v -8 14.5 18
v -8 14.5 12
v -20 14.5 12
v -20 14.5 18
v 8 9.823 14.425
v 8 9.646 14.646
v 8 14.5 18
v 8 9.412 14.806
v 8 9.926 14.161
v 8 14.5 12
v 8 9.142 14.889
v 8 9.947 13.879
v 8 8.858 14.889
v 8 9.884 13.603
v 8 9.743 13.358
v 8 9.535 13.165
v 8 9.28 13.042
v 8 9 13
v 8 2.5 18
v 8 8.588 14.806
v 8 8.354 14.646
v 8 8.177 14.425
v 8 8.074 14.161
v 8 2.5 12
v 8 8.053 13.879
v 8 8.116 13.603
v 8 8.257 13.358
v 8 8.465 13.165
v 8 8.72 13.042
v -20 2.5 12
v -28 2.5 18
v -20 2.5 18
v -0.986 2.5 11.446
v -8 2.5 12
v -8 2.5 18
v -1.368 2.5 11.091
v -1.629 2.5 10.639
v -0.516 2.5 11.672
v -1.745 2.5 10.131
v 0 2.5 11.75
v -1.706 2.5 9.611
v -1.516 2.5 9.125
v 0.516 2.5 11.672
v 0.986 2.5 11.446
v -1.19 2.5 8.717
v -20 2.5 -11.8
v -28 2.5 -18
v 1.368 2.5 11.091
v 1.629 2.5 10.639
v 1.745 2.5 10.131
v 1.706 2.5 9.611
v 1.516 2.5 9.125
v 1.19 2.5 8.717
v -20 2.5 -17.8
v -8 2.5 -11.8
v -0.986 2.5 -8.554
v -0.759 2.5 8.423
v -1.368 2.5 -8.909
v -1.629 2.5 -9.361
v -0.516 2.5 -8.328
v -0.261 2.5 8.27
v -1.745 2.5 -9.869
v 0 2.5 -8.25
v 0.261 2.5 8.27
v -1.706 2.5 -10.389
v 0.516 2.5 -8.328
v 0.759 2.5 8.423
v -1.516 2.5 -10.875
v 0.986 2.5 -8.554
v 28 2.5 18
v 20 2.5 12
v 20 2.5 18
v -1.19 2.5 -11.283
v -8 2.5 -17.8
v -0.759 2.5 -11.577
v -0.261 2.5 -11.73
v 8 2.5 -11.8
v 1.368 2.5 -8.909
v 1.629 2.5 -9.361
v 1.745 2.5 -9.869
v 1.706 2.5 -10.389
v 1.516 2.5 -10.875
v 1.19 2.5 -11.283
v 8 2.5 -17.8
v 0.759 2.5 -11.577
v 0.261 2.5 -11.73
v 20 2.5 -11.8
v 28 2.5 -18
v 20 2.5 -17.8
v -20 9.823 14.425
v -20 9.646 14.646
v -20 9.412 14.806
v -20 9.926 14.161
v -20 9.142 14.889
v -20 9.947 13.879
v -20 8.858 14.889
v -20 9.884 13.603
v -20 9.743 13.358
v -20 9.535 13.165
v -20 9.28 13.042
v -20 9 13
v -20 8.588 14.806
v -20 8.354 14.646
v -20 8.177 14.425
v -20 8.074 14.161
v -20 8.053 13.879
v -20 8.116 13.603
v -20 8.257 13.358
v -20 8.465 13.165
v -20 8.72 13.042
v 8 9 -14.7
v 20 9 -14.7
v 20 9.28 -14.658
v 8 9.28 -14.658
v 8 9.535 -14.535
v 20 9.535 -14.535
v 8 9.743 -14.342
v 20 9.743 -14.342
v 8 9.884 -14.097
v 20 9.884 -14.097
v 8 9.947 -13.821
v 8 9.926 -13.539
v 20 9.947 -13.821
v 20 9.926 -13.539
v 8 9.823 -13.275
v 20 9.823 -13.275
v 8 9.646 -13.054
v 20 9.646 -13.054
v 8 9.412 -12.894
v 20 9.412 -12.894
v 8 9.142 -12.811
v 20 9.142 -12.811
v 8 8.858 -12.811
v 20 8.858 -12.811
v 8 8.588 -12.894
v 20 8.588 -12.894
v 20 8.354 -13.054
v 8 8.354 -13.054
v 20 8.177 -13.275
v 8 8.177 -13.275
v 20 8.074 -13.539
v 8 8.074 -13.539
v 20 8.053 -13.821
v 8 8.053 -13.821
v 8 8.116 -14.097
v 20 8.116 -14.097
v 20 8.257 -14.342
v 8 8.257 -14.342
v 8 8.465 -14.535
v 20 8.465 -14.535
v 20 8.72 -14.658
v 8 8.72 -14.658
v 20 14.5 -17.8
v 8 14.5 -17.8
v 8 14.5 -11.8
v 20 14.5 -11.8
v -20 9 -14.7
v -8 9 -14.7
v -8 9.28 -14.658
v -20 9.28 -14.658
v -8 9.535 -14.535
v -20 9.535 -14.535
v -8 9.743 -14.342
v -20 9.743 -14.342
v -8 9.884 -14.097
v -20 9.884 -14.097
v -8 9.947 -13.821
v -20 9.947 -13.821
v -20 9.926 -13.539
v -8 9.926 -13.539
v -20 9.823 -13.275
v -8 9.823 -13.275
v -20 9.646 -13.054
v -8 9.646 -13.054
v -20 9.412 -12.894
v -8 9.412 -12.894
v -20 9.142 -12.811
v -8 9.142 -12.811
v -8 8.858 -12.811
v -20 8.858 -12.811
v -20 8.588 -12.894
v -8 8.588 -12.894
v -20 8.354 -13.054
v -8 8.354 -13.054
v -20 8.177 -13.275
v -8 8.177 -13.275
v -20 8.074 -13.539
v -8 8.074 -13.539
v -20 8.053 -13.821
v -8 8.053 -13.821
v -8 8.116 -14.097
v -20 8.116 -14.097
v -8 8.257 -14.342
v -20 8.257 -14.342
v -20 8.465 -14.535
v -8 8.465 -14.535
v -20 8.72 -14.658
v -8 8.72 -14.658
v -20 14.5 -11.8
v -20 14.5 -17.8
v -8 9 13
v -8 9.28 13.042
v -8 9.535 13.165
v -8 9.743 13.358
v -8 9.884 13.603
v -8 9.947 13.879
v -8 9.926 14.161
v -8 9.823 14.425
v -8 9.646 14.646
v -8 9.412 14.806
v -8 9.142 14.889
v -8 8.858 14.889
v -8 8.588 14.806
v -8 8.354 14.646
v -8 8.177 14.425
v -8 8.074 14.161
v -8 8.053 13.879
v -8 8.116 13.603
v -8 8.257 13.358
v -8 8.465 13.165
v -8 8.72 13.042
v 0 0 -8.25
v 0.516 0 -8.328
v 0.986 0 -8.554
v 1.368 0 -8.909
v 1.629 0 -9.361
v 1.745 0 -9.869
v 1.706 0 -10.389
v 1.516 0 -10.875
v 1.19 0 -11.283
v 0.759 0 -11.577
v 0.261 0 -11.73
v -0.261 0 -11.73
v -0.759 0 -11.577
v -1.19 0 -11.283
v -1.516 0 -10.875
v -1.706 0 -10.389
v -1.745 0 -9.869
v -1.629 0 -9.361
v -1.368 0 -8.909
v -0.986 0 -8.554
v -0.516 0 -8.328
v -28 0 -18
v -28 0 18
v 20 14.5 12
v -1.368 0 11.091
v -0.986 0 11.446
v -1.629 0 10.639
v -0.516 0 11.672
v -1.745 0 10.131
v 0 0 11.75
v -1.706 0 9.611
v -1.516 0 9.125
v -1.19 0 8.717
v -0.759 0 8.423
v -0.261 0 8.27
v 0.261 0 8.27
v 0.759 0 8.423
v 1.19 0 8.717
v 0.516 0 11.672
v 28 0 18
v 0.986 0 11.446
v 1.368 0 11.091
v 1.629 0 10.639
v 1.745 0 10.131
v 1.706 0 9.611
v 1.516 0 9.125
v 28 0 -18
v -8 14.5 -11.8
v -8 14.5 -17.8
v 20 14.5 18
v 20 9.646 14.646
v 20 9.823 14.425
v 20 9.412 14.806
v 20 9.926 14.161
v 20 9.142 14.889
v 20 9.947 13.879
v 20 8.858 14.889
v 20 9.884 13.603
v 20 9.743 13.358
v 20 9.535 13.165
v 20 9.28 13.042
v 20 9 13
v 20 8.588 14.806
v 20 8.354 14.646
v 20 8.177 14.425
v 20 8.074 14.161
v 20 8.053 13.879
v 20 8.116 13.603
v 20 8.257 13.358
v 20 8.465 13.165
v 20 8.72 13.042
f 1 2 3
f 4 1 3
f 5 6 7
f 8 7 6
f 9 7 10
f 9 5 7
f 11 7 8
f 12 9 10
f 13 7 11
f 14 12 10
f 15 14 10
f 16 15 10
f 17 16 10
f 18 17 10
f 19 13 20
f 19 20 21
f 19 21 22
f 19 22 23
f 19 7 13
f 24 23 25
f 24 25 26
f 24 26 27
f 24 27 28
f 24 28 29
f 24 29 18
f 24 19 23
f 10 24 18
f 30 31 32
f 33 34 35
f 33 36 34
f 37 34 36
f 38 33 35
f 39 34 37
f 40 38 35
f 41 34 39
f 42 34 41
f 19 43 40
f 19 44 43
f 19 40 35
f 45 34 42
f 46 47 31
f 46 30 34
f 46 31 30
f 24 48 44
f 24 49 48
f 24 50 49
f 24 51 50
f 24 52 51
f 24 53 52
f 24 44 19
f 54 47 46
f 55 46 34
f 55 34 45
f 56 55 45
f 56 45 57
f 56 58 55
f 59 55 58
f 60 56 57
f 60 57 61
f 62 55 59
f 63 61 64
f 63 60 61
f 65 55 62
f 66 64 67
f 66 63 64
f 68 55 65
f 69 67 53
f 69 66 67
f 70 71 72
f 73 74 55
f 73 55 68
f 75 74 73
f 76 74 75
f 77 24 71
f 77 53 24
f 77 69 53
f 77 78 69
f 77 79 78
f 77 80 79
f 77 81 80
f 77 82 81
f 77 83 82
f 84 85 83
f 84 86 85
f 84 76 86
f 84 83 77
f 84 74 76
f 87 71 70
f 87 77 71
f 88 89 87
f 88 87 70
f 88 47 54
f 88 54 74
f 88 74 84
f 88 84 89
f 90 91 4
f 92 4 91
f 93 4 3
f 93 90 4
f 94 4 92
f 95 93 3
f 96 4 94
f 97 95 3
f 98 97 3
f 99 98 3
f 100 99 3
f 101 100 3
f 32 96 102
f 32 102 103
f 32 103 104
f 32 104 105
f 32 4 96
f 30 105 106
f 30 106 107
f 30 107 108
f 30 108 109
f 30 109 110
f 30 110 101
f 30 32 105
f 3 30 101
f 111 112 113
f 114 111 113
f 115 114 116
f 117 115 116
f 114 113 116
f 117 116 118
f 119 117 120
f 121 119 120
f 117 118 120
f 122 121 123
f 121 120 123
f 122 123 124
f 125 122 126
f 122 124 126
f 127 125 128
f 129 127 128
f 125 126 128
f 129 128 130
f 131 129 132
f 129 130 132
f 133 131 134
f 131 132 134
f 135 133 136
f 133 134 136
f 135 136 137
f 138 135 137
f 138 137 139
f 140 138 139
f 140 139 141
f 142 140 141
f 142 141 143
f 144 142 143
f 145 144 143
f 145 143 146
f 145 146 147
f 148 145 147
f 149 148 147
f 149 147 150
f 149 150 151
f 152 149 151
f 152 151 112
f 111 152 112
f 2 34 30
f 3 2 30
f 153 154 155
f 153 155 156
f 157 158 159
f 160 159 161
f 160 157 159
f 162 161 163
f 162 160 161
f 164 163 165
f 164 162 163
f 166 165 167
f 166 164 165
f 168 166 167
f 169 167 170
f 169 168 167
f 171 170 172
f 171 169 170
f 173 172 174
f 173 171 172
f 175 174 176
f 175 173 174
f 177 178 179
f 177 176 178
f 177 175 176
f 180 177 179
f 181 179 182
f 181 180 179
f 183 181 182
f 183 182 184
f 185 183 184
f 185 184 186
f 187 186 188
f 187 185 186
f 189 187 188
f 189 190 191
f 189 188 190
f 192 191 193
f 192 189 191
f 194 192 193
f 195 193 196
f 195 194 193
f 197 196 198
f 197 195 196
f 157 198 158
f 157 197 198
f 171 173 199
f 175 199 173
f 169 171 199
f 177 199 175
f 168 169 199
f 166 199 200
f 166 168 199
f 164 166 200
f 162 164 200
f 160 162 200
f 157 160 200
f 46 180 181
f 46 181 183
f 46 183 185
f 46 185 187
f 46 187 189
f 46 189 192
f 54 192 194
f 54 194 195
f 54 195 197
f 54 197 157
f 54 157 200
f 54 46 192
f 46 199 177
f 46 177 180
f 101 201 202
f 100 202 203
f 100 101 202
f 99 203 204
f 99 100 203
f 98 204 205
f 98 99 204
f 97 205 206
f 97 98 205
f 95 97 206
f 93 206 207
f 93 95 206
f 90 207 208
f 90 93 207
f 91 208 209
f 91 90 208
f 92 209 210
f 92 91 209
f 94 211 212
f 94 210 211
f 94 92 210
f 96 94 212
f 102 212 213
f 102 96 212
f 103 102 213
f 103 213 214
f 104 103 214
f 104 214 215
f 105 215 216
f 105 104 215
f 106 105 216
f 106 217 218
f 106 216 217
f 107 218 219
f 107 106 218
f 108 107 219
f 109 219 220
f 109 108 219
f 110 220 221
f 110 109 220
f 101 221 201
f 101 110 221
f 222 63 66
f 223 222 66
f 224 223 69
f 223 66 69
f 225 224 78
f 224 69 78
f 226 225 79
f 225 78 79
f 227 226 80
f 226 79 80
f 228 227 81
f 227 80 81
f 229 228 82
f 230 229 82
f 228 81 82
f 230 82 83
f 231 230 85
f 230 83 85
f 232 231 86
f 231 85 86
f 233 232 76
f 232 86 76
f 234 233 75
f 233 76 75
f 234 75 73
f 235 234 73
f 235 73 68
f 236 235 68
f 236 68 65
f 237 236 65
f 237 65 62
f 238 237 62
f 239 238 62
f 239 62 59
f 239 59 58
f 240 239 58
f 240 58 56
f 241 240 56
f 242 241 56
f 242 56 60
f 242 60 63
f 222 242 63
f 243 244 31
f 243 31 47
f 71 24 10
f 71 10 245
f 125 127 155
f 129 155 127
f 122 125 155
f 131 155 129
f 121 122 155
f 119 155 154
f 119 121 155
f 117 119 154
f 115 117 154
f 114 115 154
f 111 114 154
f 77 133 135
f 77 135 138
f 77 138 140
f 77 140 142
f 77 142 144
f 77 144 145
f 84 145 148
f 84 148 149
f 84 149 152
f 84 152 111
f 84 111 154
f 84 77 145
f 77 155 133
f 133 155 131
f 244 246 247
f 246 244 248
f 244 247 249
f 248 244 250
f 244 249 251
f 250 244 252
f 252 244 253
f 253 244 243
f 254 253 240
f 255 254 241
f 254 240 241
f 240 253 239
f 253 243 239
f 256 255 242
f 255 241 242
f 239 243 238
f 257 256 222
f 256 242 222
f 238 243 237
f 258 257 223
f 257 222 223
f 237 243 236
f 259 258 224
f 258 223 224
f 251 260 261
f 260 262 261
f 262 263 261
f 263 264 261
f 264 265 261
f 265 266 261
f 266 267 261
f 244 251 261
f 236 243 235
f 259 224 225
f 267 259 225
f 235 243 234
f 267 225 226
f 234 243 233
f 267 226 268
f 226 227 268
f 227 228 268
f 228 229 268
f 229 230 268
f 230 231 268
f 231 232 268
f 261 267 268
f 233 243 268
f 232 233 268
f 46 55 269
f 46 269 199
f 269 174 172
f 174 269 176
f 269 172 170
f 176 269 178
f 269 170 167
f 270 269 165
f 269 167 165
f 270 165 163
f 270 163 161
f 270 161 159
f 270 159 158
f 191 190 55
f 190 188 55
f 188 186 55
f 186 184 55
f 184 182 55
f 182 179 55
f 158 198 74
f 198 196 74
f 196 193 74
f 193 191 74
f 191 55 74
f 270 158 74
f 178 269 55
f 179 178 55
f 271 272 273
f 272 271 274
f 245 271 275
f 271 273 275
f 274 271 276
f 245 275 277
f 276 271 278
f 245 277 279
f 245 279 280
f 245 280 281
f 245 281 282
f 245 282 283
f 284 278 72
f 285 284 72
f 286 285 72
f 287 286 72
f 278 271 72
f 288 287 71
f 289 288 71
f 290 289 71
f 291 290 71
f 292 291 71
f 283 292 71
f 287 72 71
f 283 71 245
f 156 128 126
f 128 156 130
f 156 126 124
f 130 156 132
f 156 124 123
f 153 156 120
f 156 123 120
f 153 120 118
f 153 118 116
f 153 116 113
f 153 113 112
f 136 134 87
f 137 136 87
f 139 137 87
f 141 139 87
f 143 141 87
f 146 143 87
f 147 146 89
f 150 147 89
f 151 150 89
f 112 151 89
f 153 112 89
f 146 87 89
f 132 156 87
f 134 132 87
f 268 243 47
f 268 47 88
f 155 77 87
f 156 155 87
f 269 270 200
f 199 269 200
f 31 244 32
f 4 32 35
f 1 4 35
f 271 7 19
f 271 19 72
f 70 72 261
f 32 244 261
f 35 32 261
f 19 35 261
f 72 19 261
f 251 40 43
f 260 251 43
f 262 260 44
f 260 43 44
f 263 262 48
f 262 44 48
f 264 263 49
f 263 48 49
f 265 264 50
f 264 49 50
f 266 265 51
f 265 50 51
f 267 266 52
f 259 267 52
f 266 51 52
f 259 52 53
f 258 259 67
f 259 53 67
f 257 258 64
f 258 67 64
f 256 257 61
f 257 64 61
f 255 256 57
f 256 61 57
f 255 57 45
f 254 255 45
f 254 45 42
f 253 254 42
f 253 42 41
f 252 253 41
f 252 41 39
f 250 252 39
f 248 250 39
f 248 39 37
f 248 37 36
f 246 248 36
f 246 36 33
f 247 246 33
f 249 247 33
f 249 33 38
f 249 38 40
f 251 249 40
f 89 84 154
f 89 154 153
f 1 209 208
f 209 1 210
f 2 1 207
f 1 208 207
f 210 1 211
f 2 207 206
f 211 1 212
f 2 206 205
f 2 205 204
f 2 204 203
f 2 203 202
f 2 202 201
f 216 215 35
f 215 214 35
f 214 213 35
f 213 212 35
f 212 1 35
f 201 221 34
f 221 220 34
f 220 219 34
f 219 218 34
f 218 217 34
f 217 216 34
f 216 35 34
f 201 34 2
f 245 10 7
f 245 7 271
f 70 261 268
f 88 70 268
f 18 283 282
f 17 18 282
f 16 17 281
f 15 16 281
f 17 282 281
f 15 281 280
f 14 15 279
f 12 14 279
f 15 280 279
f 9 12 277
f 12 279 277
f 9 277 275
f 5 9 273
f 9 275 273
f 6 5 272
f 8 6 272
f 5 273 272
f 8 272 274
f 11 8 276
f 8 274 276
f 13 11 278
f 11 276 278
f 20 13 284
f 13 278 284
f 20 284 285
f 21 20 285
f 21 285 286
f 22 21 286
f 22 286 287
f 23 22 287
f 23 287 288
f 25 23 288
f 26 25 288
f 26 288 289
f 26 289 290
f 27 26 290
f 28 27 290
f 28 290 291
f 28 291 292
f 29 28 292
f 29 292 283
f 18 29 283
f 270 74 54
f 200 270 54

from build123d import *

# Parameters (mm, degrees)
SKETCH_1_W          = 56
SKETCH_1_H          = 36
EXTRUDE_1_DEPTH     = 2.5
SKETCH_2_W          = 12
SKETCH_2_H          = 6
EXTRUDE_2_DEPTH     = 12
SKETCH_3_R          = 0.95
CUT_EXTRUDE_1_DEPTH = 54.275228765
SKETCH_4_R          = 1.75
CUT_EXTRUDE_2_DEPTH = 36.383612026


with BuildPart() as part:
    # 草图1 → 凸台-拉伸1 (new body)
    with BuildSketch(Plane(origin=(0, 0, 0), x_dir=(1, 0, 0), z_dir=(0, 1, 0))):
        Rectangle(SKETCH_1_W, SKETCH_1_H)
    extrude(amount=EXTRUDE_1_DEPTH)

    # 草图2 → 凸台-拉伸2 (add)
    with BuildSketch(Plane(origin=(0, 2.5, 0), x_dir=(1, 0, 0), z_dir=(0, 1, 0))):
        with Locations((14, 14.8)):
            Rectangle(SKETCH_2_W, SKETCH_2_H)
        with Locations((14, -15)):
            Rectangle(SKETCH_2_W, SKETCH_2_H)
    extrude_2 = extrude(amount=EXTRUDE_2_DEPTH)

    # 草图3 → 切除-拉伸1 (cut, through all)
    with BuildSketch(Plane(origin=(20, 0, 0), x_dir=(0, 0, -1), z_dir=(1, 0, 0))):
        with Locations((-13.95, 9)):
            Circle(SKETCH_3_R)
        with Locations((13.75, 9)):
            Circle(SKETCH_3_R)
    cut_extrude_1 = extrude(amount=-CUT_EXTRUDE_1_DEPTH, mode=Mode.SUBTRACT)

    # 镜向1: 凸台-拉伸2, 切除-拉伸1 across plane
    add(extrude_2.mirror(Plane(origin=(0, 0, 0), x_dir=(0, 0, 1), z_dir=(1, 0, 0))))
    add(cut_extrude_1.mirror(Plane(origin=(0, 0, 0), x_dir=(0, 0, 1), z_dir=(1, 0, 0))), mode=Mode.SUBTRACT)

    # 草图4 → 切除-拉伸2 (cut, through all)
    with BuildSketch(Plane(origin=(0, 2.5, 0), x_dir=(1, 0, 0), z_dir=(0, 1, 0))):
        with Locations(Location((0, -10, 0), (0, 0, 270))):
            Circle(SKETCH_4_R)
        with Locations(Location((0, 10, 0), (0, 0, 270))):
            Circle(SKETCH_4_R)
    extrude(amount=-CUT_EXTRUDE_2_DEPTH, mode=Mode.SUBTRACT)


solid = part.part
